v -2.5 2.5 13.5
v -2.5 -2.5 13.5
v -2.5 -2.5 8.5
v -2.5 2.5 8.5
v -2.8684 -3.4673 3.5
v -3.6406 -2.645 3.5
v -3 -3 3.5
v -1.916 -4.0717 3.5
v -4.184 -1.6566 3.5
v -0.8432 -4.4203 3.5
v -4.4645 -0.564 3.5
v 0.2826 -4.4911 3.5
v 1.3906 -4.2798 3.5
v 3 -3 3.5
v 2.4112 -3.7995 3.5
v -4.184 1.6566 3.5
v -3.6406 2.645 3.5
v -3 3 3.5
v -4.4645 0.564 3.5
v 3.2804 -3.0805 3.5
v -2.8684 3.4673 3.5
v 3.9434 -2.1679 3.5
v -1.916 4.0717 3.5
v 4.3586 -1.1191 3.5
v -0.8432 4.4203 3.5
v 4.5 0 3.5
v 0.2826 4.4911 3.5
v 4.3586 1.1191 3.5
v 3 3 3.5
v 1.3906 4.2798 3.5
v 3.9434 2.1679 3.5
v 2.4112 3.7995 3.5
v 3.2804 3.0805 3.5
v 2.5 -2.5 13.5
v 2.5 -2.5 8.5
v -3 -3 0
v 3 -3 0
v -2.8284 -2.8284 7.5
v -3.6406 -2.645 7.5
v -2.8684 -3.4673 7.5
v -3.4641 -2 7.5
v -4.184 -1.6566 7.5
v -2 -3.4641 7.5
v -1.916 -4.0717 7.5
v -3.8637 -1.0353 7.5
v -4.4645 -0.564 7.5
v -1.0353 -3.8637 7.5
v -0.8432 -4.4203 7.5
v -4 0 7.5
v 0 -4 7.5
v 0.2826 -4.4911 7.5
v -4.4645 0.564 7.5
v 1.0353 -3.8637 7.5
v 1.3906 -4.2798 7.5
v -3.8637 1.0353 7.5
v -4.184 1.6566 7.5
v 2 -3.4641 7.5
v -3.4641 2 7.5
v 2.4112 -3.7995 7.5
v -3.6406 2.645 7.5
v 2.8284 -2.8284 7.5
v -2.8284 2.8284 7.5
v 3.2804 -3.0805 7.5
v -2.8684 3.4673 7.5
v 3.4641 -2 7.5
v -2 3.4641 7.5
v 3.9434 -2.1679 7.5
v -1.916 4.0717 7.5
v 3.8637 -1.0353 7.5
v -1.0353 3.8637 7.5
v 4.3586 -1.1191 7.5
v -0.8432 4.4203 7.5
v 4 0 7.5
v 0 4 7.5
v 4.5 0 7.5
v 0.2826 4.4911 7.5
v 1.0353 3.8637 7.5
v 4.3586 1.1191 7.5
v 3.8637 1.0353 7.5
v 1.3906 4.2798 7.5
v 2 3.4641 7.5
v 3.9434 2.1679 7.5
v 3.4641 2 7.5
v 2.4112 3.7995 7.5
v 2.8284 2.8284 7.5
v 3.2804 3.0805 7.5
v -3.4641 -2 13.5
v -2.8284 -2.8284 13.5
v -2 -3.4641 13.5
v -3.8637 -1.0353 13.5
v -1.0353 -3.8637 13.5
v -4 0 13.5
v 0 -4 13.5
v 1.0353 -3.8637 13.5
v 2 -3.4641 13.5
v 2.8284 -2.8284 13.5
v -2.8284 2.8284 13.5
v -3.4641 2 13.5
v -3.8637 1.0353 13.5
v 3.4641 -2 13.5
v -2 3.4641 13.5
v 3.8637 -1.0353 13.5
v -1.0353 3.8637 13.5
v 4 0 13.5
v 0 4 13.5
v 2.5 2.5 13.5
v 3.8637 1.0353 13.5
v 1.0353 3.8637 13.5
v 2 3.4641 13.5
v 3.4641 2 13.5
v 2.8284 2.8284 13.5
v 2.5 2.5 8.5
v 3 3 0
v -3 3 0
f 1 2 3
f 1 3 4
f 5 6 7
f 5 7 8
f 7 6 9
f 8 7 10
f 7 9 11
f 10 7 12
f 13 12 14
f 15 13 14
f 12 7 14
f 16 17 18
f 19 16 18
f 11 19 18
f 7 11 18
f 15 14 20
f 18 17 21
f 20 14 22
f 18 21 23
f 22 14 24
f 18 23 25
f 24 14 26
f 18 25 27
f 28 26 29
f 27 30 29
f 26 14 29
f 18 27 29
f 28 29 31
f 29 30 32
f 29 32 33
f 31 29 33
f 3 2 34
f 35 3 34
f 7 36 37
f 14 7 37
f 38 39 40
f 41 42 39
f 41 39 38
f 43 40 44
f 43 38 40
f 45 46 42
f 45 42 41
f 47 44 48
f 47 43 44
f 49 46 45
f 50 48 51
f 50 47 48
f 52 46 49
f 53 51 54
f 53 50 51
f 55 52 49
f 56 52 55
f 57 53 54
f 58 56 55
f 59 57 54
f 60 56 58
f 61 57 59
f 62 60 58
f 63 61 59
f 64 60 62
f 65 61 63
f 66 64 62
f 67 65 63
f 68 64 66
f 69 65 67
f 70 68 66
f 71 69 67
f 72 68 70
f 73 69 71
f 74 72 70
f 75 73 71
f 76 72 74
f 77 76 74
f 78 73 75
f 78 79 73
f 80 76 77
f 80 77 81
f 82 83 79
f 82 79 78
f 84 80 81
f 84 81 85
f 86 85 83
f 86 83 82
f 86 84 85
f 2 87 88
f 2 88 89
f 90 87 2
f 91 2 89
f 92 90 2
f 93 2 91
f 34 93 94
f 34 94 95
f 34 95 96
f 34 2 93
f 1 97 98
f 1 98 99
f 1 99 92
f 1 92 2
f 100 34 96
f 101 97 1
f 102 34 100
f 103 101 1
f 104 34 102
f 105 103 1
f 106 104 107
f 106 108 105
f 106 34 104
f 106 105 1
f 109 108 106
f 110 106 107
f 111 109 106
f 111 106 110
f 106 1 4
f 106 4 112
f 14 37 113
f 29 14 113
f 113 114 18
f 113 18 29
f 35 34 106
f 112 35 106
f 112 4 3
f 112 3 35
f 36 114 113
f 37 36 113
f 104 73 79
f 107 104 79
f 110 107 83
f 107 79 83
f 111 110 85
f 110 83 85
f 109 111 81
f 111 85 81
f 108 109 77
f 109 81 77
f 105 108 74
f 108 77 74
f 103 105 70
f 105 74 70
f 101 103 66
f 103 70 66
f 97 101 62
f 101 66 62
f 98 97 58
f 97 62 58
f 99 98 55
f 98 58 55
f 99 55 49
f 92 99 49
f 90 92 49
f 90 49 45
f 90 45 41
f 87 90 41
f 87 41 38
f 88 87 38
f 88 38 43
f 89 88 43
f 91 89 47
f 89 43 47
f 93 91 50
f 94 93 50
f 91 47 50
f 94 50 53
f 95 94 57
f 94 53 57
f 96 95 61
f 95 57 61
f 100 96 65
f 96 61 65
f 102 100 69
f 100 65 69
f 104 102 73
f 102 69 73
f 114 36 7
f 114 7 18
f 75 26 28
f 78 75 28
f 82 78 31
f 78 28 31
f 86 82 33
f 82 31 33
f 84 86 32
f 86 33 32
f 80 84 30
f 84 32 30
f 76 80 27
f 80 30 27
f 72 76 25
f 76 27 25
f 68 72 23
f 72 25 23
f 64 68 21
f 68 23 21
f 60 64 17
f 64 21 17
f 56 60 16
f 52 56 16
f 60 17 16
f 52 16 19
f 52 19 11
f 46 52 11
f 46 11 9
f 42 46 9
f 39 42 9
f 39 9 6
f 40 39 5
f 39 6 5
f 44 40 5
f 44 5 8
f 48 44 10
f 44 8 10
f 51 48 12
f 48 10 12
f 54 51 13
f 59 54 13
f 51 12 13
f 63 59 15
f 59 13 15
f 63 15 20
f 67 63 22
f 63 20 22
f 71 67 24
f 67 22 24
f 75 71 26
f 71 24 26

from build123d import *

# Parameters (mm, degrees)
CROQUIS1_W              = 6
CROQUIS1_H              = 6
SALIENTE_EXTRUIR1_DEPTH = 3.5
CROQUIS2_R              = 4.5
SALIENTE_EXTRUIR2_DEPTH = 4
CROQUIS3_R              = 4
SALIENTE_EXTRUIR3_DEPTH = 6
CROQUIS4_W              = 5
CROQUIS4_H              = 5
CORTAR_EXTRUIR1_DEPTH   = 5


with BuildPart() as part:
    # Croquis1 → Saliente-Extruir1 (new body)
    with BuildSketch(Plane.XY):
        Rectangle(CROQUIS1_W, CROQUIS1_H)
    extrude(amount=SALIENTE_EXTRUIR1_DEPTH)

    # Croquis2 → Saliente-Extruir2 (add)
    with BuildSketch(Plane.XY.offset(3.5)):
        Circle(CROQUIS2_R)
    extrude(amount=SALIENTE_EXTRUIR2_DEPTH)

    # Croquis3 → Saliente-Extruir3 (add)
    with BuildSketch(Plane.XY.offset(7.5)):
        Circle(CROQUIS3_R)
    extrude(amount=SALIENTE_EXTRUIR3_DEPTH)

    # Croquis4 → Cortar-Extruir1 (cut)
    with BuildSketch(Plane.XY.offset(13.5)):
        Rectangle(CROQUIS4_W, CROQUIS4_H)
    extrude(amount=-CORTAR_EXTRUIR1_DEPTH, mode=Mode.SUBTRACT)


solid = part.part
